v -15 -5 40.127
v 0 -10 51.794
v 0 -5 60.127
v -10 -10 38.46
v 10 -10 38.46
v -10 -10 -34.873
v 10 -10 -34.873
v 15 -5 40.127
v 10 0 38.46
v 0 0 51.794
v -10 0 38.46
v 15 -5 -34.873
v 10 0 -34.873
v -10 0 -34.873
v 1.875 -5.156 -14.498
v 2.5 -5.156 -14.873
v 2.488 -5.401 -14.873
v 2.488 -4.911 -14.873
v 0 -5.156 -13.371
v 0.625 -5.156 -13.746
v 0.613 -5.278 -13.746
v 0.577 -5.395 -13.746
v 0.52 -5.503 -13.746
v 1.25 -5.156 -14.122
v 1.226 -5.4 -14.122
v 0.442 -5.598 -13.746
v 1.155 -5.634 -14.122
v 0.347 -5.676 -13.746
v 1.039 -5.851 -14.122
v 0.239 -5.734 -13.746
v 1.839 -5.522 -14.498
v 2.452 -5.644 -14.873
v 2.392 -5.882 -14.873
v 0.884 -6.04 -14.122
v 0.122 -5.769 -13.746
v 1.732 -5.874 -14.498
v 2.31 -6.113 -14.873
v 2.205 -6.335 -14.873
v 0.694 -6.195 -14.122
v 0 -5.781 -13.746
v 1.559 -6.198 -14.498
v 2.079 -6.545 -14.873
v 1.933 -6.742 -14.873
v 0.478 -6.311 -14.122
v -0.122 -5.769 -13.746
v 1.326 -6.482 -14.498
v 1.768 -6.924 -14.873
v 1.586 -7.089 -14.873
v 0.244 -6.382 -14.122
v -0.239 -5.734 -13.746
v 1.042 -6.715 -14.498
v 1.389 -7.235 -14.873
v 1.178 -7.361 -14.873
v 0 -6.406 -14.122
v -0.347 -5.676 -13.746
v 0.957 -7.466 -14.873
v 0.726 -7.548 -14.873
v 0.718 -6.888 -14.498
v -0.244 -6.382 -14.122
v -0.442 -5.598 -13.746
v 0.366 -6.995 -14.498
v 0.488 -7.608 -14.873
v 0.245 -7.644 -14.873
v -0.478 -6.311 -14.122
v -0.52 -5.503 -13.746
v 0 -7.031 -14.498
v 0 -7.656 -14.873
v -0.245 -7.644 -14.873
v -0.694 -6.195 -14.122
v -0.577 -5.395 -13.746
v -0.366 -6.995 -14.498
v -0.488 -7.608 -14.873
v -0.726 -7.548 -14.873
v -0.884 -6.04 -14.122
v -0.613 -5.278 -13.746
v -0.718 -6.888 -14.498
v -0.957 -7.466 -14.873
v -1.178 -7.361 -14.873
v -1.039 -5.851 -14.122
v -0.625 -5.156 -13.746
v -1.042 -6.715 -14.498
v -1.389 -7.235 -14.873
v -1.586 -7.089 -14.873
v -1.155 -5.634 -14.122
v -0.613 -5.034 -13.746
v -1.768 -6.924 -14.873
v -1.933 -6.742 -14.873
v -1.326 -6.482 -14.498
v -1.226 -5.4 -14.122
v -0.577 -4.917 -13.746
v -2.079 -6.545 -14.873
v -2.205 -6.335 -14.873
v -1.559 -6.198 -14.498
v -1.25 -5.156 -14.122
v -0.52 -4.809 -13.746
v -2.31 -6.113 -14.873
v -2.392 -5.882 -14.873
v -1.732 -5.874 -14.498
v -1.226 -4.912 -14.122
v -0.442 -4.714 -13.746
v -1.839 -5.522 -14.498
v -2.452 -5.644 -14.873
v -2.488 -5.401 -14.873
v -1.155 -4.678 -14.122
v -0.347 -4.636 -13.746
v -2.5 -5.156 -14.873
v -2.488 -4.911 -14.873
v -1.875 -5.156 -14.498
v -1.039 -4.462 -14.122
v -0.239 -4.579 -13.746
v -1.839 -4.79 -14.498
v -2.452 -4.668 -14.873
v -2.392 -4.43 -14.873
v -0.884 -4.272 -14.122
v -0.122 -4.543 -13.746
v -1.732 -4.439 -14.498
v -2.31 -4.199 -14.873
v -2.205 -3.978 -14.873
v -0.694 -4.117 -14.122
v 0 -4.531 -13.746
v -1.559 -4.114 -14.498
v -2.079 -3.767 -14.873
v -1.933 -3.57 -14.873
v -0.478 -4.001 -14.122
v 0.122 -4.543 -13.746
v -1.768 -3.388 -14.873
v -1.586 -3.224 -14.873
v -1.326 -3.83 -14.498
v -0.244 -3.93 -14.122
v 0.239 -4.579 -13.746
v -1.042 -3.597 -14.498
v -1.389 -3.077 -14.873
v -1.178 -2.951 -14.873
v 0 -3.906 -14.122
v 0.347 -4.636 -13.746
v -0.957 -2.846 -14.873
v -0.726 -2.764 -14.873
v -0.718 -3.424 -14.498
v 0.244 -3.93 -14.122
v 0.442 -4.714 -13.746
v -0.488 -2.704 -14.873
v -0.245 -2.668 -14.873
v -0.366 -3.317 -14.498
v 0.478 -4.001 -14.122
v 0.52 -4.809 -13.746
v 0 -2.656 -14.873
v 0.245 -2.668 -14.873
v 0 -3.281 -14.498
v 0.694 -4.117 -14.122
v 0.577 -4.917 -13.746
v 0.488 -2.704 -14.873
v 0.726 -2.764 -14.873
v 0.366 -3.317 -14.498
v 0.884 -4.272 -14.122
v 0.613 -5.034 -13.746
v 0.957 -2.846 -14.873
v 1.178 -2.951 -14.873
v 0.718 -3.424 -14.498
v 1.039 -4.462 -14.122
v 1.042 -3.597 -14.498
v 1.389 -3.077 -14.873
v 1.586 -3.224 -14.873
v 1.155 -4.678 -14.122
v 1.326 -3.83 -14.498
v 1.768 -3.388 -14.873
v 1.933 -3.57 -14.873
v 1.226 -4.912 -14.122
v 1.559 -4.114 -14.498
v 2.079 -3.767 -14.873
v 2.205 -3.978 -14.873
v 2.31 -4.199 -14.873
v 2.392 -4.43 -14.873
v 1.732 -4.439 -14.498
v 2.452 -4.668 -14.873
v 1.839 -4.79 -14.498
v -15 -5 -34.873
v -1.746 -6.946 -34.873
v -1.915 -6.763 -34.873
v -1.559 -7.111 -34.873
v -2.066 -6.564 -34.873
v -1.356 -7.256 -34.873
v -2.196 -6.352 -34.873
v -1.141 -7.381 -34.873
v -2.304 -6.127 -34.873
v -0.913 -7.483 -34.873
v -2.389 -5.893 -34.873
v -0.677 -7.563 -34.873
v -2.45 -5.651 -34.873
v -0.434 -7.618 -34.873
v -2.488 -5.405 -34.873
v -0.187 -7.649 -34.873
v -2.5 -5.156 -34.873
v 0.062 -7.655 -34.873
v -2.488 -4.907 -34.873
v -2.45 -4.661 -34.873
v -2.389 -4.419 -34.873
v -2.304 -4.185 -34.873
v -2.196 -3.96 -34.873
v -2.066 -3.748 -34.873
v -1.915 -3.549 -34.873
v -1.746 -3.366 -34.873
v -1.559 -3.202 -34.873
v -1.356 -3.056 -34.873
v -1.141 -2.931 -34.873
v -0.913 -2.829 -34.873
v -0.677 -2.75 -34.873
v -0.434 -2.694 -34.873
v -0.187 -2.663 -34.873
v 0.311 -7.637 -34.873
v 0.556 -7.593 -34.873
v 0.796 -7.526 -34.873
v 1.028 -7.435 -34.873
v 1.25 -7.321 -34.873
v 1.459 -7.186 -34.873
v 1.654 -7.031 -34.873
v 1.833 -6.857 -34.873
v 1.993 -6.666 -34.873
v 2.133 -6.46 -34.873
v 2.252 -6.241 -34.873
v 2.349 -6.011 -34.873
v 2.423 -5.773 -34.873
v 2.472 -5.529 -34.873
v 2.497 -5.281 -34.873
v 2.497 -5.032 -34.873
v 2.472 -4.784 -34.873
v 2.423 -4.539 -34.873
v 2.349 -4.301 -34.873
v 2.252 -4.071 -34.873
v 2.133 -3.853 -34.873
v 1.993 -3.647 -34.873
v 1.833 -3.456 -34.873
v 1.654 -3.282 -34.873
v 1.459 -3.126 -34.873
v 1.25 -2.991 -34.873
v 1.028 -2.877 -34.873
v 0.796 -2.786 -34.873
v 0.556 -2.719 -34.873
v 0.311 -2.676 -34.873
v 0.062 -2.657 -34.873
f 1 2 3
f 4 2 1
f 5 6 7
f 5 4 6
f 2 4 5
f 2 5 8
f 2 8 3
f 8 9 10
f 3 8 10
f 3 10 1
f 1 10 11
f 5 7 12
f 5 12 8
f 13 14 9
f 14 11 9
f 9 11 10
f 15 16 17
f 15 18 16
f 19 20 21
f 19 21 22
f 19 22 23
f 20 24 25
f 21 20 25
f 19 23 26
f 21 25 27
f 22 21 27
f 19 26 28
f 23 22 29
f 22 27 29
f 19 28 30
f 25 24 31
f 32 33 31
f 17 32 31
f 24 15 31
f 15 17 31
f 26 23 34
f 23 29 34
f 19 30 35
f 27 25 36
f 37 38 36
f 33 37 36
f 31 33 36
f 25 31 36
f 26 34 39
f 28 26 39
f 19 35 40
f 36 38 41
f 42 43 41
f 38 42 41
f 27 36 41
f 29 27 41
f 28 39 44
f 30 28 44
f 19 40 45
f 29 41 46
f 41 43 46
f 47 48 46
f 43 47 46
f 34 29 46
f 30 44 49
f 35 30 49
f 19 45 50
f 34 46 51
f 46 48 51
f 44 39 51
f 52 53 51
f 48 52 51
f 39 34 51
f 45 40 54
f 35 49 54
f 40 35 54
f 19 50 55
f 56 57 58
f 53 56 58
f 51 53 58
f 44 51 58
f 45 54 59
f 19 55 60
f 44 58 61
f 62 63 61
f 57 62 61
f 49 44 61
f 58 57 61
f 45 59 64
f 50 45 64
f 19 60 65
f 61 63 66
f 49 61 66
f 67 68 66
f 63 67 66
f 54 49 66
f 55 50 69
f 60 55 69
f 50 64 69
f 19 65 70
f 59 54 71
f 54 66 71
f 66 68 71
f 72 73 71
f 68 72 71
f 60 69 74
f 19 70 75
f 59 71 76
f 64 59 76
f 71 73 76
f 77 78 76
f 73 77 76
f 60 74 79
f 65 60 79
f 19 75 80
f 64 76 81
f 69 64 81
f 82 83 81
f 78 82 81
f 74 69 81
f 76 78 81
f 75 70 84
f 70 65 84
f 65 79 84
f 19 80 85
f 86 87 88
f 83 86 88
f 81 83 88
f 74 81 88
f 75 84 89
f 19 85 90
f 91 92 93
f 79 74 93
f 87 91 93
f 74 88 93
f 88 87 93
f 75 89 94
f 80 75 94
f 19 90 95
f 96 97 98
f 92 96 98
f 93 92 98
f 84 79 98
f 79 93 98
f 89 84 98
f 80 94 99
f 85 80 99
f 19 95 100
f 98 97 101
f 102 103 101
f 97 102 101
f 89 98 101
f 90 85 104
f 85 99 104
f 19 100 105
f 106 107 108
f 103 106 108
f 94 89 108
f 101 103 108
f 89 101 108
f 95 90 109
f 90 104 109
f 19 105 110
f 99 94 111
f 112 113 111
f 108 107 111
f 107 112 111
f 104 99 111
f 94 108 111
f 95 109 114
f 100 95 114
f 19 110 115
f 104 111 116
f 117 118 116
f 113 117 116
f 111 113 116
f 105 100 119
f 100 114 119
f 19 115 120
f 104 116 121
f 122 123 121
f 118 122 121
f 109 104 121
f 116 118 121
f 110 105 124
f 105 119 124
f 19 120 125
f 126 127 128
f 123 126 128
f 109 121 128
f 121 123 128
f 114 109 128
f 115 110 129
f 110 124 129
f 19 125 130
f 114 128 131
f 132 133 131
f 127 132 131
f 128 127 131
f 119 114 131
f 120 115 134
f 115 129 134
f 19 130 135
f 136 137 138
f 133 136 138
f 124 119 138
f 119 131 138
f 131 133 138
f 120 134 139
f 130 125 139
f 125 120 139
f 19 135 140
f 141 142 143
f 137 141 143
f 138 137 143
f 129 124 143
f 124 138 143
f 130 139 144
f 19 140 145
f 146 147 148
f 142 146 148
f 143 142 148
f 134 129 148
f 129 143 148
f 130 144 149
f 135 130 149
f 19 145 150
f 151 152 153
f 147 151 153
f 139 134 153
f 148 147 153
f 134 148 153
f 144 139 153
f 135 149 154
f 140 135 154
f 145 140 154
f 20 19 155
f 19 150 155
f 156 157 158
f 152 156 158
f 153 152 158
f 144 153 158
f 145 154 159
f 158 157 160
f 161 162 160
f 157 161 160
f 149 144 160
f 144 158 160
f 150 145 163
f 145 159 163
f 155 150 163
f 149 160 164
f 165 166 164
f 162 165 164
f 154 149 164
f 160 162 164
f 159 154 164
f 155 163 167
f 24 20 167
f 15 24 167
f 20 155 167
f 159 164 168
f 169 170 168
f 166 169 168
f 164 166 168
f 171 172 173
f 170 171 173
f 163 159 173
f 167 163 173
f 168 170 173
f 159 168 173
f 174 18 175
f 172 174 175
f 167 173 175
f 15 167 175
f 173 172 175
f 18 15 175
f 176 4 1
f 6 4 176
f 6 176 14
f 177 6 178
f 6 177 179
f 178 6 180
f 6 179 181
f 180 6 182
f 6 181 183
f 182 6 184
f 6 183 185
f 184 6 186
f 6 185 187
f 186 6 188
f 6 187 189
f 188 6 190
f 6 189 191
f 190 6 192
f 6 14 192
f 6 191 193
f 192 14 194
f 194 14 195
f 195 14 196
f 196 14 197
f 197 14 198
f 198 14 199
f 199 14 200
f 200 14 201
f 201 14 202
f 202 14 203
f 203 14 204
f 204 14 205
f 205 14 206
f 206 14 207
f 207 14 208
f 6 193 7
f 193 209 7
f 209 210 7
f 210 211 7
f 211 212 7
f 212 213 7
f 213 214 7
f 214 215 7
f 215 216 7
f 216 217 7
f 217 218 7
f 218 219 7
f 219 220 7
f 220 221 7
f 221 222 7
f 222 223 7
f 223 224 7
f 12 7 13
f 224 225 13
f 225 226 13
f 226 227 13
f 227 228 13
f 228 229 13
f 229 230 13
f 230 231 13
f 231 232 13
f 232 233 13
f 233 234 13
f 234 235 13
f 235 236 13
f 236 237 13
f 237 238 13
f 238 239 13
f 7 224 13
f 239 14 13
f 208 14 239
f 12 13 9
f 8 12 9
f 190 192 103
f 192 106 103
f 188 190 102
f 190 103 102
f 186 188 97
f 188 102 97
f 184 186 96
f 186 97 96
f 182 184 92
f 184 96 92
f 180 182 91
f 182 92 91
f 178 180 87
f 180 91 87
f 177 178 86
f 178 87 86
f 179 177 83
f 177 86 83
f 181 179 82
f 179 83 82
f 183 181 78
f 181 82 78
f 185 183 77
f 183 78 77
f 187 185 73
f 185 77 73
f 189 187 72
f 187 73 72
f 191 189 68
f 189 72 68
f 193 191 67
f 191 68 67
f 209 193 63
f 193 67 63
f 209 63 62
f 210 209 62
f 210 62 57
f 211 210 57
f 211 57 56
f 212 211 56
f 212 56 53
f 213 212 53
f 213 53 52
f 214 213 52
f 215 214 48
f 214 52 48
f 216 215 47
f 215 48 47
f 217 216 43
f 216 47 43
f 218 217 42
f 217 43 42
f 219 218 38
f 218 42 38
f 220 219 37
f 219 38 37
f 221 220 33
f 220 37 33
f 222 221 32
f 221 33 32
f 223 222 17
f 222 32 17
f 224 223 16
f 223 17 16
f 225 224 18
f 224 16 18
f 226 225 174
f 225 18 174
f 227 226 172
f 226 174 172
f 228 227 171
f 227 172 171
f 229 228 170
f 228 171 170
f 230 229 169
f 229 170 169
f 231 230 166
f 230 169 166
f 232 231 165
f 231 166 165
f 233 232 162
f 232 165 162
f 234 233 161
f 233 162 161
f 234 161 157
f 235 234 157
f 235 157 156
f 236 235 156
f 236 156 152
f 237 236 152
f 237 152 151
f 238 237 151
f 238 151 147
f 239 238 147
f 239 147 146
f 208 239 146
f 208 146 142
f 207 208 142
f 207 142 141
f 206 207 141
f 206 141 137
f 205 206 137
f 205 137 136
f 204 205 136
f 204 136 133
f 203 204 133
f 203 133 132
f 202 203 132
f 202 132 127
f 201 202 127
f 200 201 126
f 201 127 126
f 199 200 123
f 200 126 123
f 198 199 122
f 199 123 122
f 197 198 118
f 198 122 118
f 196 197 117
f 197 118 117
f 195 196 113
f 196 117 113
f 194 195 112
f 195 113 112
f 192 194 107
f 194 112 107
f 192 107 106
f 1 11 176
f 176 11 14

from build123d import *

# Parameters (mm, degrees)
F1_DEPTH = 10
F2_SIZE  = 4.99999
F4_D     = 5
F4_DEPTH = 20
F4_TIP   = 1.5021515476


# Not quite as in the source:
# - a fillet or chamfer is up to 0.001 mm smaller than in the source, because OpenCascade refuses the exact size


with BuildPart() as f1:
    # F0 (on Front) → F1 (new body)
    with BuildSketch(Plane.XZ):
        Polygon((0, 60.1269584066), (-15, 40.1269584066), (-15, -34.8730415934), (15, -34.8730415934), (15, 40.1269584066), align=None)
    extrude(amount=F1_DEPTH)

    # F2 (size 5 in the source; OpenCascade refuses exactly that, so slightly less here)
    f2_edges = [f1.edges().sort_by_distance(p)[0] for p in [
        (-15, -10, 2.626958),
        (-15, 0, 2.626958),
        (-7.5, -10, 50.126958),
        (-7.5, 0, 50.126958),
        (7.5, -10, 50.126958),
        (7.5, 0, 50.126958),
        (15, -10, 2.626958),
        (15, 0, 2.626958),
    ]]
    chamfer(f2_edges, length=F2_SIZE)

    # F4
    with Locations(Plane(origin=(0, 0, -34.8730415934), x_dir=(1, 0, 0), z_dir=(0, 0, -1))):
        with Locations((0, 5.1561156288)):
            Hole(F4_D / 2, depth=F4_DEPTH)
            with Locations((0, 0, -(F4_DEPTH + F4_TIP / 2))):  # 118° drill point
                Cone(0, F4_D / 2, F4_TIP, mode=Mode.SUBTRACT)


solid = f1.part
